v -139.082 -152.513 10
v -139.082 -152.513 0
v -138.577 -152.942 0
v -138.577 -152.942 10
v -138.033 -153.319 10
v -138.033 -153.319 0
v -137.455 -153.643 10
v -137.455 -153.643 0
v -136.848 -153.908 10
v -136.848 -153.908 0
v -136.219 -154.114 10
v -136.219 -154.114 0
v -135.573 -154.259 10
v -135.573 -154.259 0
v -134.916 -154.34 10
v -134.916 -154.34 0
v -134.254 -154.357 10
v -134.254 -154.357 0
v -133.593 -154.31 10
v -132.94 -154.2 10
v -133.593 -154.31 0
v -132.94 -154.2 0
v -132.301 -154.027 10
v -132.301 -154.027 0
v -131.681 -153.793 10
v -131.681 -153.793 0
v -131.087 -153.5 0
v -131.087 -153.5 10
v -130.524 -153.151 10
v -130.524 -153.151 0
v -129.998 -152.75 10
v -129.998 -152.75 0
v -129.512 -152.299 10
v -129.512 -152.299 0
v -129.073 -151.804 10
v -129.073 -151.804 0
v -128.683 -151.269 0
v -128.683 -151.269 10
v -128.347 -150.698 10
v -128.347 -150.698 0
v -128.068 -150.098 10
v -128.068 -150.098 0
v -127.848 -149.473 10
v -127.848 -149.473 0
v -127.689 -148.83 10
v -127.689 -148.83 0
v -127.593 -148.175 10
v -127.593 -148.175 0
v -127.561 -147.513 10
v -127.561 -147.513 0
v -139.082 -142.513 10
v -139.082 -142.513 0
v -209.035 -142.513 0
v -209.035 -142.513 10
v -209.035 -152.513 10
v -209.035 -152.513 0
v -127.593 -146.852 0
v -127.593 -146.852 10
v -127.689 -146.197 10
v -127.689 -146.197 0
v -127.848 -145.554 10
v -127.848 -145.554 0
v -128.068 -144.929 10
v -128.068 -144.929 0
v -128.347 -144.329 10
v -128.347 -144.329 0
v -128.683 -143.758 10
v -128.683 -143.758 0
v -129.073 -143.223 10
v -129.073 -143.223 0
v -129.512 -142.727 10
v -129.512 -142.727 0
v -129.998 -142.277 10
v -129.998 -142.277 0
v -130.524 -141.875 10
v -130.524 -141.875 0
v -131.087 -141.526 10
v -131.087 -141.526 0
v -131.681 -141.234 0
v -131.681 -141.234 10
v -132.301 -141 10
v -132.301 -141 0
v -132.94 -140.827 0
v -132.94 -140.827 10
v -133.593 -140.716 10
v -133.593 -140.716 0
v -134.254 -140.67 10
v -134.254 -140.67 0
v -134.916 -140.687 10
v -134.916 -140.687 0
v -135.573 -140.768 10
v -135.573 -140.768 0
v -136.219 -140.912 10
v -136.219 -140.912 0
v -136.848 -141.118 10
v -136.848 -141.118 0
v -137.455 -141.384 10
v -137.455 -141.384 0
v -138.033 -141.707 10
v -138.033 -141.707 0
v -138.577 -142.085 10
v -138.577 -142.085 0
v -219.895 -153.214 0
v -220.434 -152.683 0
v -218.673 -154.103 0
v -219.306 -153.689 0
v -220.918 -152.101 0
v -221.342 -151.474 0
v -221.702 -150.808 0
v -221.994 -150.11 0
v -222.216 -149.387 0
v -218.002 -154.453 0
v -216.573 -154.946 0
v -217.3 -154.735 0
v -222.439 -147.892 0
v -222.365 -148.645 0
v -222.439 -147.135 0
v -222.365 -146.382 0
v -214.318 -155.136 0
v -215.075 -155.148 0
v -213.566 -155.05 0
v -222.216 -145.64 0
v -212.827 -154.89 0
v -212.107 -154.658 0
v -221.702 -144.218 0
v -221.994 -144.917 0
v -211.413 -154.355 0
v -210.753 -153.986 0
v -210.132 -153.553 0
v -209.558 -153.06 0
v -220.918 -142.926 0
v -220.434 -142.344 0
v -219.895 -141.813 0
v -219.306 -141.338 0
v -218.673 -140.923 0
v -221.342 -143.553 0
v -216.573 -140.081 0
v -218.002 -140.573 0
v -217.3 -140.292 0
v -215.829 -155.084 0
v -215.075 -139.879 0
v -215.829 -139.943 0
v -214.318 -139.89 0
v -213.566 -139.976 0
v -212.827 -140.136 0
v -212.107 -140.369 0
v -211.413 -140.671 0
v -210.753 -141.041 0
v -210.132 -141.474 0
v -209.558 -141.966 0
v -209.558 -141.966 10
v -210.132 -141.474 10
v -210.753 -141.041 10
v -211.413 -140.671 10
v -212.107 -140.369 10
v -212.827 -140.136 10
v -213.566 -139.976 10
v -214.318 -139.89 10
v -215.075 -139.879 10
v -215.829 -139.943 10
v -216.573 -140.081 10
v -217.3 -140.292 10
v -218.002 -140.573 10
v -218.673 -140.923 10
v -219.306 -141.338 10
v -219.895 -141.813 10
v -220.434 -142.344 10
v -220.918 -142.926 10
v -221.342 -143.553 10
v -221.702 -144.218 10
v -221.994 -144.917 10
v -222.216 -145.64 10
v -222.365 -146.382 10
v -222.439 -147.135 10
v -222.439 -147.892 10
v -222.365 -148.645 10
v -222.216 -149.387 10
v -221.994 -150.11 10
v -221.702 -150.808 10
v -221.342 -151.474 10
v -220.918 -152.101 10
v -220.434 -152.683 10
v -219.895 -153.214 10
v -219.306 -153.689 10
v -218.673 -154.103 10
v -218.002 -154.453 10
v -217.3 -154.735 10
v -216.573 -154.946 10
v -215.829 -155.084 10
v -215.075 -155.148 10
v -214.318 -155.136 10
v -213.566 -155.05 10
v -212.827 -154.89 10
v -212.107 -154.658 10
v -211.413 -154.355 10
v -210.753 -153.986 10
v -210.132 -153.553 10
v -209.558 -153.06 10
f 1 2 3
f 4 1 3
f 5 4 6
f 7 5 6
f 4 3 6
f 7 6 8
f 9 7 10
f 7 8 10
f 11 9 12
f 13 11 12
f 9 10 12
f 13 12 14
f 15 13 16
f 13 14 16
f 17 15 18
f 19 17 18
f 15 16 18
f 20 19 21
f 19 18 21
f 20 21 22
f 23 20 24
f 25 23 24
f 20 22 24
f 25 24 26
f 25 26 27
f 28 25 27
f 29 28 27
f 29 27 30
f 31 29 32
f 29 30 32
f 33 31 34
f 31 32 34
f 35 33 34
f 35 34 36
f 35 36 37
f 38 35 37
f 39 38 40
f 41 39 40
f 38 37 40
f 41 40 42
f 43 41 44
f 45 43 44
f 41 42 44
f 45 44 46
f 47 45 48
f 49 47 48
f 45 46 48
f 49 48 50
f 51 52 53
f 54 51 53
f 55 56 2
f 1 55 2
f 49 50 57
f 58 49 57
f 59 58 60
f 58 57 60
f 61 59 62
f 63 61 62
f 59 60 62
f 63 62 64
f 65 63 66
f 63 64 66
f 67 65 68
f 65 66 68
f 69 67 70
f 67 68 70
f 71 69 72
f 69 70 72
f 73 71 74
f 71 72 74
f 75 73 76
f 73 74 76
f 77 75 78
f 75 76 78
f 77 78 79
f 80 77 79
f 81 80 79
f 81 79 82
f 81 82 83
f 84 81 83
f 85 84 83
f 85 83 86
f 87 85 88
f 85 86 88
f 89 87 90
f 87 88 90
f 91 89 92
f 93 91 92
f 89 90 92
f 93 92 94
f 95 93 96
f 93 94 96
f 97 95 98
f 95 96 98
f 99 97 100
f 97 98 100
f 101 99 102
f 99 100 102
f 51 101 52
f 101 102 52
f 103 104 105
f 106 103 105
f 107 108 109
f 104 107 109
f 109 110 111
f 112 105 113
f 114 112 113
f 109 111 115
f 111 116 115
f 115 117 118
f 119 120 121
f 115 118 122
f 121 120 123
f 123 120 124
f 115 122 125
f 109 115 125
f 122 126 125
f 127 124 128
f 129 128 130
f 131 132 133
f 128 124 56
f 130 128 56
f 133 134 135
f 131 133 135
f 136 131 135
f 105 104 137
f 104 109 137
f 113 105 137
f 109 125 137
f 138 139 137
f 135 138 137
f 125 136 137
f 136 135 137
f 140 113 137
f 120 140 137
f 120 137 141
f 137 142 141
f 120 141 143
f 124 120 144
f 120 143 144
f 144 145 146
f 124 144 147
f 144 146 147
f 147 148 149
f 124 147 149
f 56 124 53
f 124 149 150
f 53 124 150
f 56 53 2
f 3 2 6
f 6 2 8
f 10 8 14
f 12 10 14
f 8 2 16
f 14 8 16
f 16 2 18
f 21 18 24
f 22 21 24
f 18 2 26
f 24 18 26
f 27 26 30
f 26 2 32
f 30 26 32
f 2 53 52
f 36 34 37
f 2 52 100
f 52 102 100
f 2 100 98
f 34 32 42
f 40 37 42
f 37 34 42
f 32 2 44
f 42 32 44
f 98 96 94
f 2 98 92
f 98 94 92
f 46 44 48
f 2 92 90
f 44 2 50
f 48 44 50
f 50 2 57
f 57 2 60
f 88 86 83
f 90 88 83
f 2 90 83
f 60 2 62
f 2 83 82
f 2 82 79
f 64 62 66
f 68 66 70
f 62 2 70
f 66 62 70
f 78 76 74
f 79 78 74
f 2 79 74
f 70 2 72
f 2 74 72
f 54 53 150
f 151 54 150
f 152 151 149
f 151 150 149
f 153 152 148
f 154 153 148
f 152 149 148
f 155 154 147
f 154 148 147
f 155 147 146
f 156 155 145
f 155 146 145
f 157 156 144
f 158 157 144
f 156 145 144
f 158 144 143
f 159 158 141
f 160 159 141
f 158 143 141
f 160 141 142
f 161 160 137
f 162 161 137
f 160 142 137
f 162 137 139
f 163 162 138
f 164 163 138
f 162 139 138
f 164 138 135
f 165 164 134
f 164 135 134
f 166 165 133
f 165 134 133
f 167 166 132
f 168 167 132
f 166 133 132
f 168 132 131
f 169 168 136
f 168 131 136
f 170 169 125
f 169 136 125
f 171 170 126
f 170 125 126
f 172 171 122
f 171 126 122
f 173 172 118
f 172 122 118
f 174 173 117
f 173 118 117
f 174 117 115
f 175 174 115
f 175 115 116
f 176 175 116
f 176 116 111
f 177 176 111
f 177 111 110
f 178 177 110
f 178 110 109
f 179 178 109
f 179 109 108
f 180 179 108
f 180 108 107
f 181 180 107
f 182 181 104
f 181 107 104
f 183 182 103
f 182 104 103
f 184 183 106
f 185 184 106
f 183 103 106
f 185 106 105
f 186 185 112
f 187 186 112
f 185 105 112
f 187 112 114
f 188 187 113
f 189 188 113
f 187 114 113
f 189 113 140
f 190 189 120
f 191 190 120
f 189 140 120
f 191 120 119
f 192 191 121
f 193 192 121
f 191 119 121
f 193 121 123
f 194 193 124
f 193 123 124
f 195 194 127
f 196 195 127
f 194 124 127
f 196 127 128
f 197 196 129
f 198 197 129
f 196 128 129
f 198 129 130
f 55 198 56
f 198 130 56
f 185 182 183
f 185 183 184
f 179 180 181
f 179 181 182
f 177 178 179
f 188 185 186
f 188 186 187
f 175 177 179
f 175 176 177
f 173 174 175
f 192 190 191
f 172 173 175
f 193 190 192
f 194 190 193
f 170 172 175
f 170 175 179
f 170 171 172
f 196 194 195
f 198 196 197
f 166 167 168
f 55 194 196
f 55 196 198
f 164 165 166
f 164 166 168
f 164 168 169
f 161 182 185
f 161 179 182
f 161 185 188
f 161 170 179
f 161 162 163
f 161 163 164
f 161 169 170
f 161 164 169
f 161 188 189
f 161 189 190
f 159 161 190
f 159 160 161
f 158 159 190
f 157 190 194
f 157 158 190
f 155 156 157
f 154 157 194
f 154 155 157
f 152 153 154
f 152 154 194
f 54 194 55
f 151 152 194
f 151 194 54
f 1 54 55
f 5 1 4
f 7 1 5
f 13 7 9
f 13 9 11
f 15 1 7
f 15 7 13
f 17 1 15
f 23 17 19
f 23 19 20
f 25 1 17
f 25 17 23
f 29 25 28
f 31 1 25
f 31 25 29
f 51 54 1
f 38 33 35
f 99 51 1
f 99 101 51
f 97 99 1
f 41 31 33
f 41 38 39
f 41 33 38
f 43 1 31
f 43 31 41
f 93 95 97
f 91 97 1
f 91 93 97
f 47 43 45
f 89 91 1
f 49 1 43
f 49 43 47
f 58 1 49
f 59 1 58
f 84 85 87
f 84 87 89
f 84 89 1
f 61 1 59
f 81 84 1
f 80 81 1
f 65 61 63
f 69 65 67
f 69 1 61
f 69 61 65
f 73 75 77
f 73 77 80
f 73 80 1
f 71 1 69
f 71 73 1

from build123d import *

# Parameters (mm, degrees)
F3_DEPTH = 10


with BuildPart() as f3:
    # F2 (on face) → F3 (new body)
    with BuildSketch(Plane.XY):
        with BuildLine():
            ThreePointArc((-207.1709679964, -147.5133103132), (-207.6520447758, -144.8452854186), (-209.0346813202, -142.5133103132))
            Line((-209.0346813202, -142.5133103132), (-209.0346813202, -152.5133103132))
            ThreePointArc((-209.0346813202, -152.5133103132), (-207.6520447758, -150.1813352079), (-207.1709679964, -147.5133103132))
        make_face()
        with BuildLine():
            Line((-139.082004335, -142.5133103132), (-209.0346813202, -142.5133103132))
            ThreePointArc((-209.0346813202, -142.5133103132), (-207.6520447758, -144.8452854186), (-207.1709679964, -147.5133103132))
            ThreePointArc((-207.1709679964, -147.5133103132), (-207.6520447758, -150.1813352079), (-209.0346813202, -152.5133103132))
            Line((-209.0346813202, -152.5133103132), (-139.082004335, -152.5133103132))
            ThreePointArc((-139.082004335, -152.5133103132), (-141.2519729984, -147.5133103132), (-139.082004335, -142.5133103132))
        make_face()
        with BuildLine():
            Line((-209.0346813202, -152.5133103132), (-209.0346813202, -142.5133103132))
            ThreePointArc((-209.0346813202, -142.5133103132), (-222.4487615225, -147.5133103132), (-209.0346813202, -152.5133103132))
        make_face()
        with BuildLine():
            ThreePointArc((-127.5611006367, -147.5133103132), (-131.6812494932, -141.2337557505), (-139.082004335, -142.5133103132))
            Line((-139.082004335, -142.5133103132), (-139.0346813202, -142.5133103132))
            Line((-139.0346813202, -142.5133103132), (-139.0346813202, -152.5133103132))
            Line((-139.0346813202, -152.5133103132), (-139.082004335, -152.5133103132))
            ThreePointArc((-139.082004335, -152.5133103132), (-131.6812494932, -153.792864876), (-127.5611006367, -147.5133103132))
        make_face()
        with BuildLine():
            Line((-139.0346813202, -142.5133103132), (-139.082004335, -142.5133103132))
            ThreePointArc((-139.082004335, -142.5133103132), (-141.2519729984, -147.5133103132), (-139.082004335, -152.5133103132))
            Line((-139.082004335, -152.5133103132), (-139.0346813202, -152.5133103132))
            Line((-139.0346813202, -152.5133103132), (-139.0346813202, -142.5133103132))
        make_face()
    extrude(amount=F3_DEPTH)


solid = f3.part
